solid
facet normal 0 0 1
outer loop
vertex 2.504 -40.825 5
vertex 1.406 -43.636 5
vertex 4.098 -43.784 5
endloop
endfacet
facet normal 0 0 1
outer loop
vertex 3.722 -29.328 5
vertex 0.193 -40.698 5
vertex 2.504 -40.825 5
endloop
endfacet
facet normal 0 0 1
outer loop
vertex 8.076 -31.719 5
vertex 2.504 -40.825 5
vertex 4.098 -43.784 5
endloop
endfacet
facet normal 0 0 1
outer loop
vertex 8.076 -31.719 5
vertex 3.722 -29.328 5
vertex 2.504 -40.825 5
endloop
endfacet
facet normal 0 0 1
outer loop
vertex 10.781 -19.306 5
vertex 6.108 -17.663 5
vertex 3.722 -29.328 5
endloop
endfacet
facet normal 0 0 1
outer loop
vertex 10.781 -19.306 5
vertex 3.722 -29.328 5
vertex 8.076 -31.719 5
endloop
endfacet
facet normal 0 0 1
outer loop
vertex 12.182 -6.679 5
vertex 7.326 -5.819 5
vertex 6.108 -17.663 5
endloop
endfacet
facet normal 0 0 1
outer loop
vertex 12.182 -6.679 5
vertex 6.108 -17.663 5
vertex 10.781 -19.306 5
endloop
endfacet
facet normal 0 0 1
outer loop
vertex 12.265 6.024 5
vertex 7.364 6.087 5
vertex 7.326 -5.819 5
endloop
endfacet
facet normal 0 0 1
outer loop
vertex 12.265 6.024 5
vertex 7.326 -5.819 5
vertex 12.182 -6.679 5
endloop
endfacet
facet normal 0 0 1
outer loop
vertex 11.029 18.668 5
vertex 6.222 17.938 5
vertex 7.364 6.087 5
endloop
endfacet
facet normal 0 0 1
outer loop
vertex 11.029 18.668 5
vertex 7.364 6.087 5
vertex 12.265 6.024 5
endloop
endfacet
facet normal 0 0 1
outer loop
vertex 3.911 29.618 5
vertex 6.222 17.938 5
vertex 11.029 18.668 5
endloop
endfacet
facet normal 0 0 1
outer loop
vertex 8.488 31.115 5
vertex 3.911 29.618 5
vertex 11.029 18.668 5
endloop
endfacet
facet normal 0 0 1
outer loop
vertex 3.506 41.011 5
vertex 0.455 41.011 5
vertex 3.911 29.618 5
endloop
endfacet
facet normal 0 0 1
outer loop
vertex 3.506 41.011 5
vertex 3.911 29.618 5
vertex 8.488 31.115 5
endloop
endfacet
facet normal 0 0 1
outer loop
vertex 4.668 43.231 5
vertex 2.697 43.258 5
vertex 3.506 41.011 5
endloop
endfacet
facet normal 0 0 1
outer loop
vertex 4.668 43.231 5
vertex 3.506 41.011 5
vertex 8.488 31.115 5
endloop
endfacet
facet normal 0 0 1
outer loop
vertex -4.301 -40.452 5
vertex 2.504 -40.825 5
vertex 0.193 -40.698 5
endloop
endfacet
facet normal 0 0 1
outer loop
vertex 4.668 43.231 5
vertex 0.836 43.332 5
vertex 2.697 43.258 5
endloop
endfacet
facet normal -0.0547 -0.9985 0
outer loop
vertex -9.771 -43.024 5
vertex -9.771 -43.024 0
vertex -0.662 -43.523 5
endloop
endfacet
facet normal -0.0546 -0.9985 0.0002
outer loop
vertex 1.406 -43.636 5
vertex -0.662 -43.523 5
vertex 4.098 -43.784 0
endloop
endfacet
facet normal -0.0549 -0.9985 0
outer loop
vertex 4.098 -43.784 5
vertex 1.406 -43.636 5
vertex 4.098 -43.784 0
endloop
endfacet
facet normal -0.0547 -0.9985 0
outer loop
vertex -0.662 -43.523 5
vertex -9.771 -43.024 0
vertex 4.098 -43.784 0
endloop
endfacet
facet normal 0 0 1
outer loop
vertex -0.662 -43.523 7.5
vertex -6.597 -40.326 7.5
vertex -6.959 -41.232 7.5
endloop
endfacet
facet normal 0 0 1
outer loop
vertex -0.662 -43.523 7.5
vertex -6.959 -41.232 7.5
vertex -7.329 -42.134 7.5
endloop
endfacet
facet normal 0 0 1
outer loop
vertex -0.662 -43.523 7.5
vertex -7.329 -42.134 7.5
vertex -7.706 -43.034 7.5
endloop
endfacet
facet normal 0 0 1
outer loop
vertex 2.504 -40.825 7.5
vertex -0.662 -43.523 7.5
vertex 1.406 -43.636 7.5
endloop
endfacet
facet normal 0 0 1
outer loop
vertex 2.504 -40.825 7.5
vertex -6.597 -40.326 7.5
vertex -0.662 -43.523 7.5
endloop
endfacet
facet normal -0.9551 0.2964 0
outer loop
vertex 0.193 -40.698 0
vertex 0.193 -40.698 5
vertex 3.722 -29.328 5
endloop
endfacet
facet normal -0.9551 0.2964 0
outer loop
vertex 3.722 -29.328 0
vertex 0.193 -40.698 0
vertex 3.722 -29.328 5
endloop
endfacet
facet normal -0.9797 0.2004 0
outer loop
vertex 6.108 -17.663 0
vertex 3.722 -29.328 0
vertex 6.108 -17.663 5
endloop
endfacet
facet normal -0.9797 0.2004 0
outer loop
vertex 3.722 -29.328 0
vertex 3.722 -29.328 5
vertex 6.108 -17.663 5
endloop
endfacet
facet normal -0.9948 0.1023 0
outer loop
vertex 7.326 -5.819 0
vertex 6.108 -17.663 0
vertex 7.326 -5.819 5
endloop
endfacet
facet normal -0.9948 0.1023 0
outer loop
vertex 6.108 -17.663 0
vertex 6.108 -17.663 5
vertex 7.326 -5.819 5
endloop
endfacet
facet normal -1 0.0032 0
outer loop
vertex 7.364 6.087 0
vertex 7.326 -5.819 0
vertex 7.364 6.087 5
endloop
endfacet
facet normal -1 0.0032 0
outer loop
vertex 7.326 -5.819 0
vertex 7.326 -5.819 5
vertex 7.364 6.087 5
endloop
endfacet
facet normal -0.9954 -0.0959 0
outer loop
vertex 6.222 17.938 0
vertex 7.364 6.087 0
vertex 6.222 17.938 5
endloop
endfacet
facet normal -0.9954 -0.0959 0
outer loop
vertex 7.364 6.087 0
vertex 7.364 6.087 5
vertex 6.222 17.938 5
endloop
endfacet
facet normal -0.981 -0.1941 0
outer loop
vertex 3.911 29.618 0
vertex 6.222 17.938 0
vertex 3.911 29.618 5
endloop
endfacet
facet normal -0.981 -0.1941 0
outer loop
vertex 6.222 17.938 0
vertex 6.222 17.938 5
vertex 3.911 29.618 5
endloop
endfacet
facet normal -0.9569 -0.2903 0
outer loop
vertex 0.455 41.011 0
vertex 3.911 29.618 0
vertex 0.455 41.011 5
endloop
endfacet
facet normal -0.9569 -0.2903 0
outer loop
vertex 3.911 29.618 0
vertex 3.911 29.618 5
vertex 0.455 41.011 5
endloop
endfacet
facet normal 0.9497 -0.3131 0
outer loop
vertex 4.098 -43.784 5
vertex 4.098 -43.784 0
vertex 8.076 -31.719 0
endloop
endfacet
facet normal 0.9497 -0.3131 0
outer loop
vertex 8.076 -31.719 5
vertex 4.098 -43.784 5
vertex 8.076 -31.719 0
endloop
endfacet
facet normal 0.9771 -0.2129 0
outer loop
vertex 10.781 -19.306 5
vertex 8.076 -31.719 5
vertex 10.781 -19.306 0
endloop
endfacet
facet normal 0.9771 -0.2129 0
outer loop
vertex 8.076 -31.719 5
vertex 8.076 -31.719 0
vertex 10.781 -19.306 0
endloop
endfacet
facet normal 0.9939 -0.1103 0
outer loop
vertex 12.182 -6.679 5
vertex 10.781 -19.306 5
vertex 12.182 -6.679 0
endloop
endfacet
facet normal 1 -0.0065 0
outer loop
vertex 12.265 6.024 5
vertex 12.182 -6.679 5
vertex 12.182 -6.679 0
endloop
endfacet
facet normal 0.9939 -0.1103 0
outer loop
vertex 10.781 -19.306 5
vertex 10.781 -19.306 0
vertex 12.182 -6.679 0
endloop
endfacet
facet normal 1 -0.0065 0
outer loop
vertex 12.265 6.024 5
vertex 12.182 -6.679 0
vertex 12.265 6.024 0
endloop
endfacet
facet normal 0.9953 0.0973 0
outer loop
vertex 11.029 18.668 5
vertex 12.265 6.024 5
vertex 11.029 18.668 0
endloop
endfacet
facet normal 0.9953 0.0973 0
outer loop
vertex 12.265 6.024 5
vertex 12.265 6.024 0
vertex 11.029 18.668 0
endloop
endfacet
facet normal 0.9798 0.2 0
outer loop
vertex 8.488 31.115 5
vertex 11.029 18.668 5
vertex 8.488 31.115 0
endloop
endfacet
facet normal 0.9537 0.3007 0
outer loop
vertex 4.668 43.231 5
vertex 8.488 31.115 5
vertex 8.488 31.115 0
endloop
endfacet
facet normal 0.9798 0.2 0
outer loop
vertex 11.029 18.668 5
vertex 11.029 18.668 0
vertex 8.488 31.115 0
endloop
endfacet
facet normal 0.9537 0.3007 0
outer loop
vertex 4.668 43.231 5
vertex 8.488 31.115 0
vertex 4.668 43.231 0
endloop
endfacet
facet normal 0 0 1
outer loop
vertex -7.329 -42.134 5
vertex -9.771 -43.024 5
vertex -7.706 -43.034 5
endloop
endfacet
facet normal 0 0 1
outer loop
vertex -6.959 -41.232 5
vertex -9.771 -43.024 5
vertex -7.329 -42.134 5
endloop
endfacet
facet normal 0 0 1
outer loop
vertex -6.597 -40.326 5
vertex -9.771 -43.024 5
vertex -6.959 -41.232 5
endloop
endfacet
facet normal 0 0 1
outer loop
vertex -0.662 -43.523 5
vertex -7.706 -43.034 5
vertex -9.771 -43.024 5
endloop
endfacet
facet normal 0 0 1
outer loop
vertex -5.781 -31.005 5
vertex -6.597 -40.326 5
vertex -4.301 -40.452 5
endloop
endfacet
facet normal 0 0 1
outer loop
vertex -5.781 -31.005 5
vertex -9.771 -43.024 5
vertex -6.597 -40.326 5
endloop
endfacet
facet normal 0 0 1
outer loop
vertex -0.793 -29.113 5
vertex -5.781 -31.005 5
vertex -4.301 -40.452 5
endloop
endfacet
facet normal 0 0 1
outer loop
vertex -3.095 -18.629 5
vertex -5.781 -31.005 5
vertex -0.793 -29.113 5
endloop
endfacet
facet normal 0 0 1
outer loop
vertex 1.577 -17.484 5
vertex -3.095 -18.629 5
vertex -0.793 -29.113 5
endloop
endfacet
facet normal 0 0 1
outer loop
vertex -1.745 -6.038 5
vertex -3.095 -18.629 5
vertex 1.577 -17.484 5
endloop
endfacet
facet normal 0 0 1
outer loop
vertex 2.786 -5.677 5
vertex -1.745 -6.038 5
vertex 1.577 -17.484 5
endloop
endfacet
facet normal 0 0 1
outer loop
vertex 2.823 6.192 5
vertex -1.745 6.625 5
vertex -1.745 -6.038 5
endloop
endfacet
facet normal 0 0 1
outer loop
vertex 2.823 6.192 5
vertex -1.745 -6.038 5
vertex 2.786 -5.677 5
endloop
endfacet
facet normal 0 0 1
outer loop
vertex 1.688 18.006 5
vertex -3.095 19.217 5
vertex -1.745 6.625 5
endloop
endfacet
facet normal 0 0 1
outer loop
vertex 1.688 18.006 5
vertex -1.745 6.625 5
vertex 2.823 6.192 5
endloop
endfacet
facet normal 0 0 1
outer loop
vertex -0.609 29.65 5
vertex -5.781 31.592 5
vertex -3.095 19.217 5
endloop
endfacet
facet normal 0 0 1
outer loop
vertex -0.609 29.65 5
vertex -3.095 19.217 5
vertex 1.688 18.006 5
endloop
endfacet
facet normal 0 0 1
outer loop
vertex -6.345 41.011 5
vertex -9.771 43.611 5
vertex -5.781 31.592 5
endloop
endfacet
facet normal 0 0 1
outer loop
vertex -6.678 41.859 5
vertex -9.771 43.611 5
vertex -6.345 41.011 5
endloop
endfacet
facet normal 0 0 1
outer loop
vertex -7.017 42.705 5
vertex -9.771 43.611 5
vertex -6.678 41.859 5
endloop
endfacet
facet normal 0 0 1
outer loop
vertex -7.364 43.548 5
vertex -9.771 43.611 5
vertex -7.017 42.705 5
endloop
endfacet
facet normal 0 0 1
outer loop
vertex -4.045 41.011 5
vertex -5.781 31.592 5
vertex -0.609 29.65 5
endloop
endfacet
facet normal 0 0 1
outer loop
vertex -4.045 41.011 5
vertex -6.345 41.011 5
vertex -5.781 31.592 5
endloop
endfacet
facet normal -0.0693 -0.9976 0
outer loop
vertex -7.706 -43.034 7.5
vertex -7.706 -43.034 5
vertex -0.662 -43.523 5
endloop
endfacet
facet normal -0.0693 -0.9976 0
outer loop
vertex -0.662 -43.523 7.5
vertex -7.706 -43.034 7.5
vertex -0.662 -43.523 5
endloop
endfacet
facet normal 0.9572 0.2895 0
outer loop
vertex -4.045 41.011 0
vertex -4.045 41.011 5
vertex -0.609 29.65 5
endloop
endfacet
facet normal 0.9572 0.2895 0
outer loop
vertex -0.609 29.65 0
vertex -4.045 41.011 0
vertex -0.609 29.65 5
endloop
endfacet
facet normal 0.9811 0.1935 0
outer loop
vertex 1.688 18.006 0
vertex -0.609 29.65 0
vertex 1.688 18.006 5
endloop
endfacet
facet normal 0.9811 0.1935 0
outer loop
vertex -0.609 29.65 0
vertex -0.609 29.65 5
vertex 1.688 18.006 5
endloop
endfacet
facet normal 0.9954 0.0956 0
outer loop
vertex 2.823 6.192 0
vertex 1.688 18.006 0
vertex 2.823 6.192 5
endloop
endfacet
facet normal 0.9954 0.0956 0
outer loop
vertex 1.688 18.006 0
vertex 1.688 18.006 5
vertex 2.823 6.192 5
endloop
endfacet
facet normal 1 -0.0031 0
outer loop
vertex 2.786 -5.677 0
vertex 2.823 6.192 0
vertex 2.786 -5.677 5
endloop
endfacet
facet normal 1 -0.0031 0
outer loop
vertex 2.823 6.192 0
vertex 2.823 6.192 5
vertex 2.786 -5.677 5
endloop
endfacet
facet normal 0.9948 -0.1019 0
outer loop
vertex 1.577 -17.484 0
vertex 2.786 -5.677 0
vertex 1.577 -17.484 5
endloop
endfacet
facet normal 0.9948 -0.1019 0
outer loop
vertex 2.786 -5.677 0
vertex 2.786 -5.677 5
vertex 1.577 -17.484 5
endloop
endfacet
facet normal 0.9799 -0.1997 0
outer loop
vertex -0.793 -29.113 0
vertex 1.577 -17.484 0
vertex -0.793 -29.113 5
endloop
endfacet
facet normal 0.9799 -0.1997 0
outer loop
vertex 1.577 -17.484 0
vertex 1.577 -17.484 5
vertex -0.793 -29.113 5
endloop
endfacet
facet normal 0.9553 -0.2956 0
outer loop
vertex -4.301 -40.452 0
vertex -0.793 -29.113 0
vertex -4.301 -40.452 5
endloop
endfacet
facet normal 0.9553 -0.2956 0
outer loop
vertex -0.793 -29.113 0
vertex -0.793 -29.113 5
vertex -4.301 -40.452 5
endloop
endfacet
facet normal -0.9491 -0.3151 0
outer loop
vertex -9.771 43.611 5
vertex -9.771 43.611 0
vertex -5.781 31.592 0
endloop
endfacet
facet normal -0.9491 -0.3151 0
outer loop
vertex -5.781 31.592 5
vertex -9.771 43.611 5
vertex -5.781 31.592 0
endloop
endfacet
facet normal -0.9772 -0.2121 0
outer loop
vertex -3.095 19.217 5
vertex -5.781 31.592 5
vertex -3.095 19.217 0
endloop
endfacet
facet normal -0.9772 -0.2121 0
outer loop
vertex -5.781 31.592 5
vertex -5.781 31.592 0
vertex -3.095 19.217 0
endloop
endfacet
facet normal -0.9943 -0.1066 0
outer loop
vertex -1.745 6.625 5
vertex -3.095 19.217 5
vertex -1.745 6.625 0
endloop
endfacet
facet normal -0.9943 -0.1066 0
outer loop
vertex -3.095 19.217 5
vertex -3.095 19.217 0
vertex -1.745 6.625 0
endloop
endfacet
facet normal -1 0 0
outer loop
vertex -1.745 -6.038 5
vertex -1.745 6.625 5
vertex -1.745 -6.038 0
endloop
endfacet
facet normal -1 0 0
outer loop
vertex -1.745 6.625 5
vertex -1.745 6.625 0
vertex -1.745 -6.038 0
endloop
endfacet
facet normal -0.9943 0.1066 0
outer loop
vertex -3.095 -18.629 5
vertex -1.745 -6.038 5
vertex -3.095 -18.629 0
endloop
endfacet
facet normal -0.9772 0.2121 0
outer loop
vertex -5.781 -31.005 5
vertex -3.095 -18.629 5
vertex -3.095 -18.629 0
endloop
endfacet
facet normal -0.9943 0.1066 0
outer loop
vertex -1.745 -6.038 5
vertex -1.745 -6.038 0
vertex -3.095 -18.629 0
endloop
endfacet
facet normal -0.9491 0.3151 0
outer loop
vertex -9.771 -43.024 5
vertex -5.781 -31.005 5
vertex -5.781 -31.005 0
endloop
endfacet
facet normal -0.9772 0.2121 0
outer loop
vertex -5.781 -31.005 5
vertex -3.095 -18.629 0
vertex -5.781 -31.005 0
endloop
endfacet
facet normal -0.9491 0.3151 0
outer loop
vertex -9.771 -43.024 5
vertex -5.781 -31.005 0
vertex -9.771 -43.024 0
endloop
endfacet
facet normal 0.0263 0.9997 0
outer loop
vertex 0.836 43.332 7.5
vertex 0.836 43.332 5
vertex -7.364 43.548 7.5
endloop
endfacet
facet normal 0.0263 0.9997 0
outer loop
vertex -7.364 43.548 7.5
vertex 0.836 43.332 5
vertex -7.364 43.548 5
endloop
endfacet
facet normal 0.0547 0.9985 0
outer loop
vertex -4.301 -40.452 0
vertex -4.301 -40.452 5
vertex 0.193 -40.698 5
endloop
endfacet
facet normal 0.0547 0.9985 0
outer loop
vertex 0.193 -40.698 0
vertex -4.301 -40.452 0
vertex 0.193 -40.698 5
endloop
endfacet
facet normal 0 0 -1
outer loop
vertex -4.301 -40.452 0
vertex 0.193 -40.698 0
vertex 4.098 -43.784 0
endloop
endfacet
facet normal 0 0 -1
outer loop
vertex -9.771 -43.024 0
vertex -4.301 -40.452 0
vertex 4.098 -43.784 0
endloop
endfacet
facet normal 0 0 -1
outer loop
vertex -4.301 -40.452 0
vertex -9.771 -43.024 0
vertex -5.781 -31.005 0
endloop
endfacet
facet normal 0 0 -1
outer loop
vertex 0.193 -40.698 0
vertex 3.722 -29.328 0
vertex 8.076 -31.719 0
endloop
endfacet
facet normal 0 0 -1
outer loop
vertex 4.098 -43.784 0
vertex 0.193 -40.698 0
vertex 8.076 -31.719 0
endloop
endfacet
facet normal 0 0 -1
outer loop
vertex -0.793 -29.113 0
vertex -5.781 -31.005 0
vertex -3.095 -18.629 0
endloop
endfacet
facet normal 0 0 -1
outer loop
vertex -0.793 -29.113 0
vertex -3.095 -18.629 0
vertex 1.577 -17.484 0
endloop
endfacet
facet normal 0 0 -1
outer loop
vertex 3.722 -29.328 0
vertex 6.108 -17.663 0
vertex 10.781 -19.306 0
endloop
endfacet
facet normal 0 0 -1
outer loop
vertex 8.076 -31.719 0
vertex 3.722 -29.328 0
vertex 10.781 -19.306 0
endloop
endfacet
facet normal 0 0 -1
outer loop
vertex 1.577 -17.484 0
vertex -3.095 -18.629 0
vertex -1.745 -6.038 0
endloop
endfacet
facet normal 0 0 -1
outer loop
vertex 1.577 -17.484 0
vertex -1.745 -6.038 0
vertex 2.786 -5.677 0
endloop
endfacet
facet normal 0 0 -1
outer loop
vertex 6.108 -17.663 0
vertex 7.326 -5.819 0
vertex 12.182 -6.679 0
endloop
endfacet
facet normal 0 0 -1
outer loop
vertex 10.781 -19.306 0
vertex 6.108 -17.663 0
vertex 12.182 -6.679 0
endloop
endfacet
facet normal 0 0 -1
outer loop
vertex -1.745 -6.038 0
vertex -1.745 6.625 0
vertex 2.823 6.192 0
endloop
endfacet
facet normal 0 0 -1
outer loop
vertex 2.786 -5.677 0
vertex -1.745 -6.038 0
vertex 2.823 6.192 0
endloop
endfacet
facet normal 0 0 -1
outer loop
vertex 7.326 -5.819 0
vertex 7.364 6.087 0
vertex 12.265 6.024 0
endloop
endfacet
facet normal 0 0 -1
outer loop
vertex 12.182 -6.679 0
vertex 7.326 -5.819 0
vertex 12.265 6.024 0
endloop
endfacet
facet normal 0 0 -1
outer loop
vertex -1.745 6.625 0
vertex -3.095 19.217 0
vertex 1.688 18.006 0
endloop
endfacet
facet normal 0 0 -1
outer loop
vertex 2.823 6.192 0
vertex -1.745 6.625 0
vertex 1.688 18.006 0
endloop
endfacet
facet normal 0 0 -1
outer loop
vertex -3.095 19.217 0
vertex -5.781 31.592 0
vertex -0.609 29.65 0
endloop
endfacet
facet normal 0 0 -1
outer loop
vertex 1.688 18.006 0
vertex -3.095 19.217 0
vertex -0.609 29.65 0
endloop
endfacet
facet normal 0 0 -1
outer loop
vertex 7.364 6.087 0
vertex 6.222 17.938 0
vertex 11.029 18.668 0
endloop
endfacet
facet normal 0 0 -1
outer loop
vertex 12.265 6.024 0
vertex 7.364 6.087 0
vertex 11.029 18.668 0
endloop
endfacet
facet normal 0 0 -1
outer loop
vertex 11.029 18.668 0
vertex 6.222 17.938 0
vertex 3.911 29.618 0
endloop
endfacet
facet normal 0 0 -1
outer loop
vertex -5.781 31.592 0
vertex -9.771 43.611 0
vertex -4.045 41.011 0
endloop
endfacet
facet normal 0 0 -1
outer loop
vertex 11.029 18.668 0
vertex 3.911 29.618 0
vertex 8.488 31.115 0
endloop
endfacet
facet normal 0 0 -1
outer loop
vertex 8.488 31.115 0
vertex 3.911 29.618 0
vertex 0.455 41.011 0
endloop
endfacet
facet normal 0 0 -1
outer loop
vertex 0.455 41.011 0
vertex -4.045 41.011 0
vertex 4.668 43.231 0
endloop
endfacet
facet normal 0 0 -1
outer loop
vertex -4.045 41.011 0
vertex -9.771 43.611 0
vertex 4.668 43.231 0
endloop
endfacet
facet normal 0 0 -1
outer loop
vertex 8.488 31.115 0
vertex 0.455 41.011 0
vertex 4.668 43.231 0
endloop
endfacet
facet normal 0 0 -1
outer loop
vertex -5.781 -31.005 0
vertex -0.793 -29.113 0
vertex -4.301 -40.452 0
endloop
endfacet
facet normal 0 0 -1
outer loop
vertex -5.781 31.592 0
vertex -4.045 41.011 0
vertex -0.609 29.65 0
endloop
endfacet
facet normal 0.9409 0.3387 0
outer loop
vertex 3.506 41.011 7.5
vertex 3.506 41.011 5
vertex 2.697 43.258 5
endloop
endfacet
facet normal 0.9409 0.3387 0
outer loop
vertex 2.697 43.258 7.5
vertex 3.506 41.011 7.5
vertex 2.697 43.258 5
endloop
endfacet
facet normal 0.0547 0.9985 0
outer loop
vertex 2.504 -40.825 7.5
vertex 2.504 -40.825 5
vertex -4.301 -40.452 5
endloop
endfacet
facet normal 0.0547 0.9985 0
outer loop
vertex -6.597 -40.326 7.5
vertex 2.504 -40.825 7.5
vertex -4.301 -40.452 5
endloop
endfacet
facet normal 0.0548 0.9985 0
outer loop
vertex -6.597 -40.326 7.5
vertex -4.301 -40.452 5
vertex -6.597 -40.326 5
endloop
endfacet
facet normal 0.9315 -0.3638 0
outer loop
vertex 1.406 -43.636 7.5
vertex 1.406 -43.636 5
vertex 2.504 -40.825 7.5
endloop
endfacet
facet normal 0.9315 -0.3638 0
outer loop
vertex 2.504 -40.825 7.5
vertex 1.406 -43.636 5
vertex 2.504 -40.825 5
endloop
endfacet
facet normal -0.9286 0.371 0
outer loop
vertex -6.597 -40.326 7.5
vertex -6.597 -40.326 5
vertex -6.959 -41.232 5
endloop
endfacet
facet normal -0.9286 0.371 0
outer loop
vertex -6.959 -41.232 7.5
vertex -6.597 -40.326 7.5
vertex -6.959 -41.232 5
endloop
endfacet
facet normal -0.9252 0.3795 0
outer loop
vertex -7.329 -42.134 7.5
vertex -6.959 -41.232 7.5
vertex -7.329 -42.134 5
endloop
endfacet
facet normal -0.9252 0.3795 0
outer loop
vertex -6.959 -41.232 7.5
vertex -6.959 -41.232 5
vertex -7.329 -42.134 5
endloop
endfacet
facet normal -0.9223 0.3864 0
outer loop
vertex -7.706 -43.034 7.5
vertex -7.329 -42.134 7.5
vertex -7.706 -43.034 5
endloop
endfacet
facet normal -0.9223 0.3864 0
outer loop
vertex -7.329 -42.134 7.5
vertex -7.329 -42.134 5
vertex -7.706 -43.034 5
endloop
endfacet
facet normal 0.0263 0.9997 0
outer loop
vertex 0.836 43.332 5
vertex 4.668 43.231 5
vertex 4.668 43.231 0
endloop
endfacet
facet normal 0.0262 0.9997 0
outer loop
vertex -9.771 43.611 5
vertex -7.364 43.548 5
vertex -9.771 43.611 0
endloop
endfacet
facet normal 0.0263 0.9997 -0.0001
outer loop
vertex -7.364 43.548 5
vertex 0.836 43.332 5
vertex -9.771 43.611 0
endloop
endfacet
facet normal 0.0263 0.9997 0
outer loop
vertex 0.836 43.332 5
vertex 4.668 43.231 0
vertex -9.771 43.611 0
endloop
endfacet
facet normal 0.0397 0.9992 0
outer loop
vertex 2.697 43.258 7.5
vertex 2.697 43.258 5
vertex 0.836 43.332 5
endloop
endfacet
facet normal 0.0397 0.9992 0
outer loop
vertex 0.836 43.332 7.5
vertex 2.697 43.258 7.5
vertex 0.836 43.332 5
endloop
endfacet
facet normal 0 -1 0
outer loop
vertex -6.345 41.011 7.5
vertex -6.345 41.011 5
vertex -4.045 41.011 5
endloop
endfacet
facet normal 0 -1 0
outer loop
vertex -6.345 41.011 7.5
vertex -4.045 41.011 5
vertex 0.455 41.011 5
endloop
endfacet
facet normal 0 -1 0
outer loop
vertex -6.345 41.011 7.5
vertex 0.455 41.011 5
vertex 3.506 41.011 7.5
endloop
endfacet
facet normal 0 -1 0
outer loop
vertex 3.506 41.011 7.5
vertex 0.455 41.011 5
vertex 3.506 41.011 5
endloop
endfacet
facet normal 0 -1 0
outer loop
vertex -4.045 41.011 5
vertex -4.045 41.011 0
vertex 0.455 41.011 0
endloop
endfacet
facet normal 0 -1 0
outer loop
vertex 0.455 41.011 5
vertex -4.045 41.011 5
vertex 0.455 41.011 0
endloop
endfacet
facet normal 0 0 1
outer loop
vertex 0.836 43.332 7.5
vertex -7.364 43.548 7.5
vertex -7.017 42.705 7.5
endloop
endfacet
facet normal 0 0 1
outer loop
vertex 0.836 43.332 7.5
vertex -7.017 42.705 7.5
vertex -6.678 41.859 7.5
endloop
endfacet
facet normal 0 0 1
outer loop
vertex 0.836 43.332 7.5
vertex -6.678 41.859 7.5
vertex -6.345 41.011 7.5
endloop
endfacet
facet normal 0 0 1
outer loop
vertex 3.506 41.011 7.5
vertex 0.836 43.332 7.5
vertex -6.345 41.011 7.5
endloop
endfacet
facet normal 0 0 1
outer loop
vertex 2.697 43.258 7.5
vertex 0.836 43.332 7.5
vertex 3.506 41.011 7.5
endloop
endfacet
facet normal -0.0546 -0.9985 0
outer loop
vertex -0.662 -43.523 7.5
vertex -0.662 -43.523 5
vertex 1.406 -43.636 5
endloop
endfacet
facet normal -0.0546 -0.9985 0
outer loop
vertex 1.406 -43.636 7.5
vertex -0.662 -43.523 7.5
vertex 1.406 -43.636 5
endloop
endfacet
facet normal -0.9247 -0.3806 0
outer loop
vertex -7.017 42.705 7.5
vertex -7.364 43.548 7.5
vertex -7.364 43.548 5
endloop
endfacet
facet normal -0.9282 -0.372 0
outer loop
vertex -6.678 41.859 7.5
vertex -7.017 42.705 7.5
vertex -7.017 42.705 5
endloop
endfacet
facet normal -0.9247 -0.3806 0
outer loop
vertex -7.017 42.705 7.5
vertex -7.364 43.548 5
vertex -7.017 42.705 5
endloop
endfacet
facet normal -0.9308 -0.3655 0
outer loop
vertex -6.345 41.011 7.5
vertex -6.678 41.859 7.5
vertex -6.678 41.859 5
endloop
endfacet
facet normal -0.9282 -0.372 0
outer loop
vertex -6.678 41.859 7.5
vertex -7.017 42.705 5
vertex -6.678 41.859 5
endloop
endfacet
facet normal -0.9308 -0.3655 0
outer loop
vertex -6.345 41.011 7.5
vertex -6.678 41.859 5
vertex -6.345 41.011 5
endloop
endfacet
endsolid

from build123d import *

# Parameters (mm, degrees)
F1_DEPTH = 5
F3_DEPTH = 2.5
F5_DEPTH = 25


with BuildPart() as f1:
    # F0 (on Top) → F1 (new body)
    with BuildSketch(Plane.XY):
        with BuildLine():
            ThreePointArc((-9.771052, 43.610957), (-1.575845, 0.293702), (-9.771052, -43.023552))
            Line((-9.771052, -43.023552), (4.098068, -43.7835))
            ThreePointArc((4.098068, -43.7835), (12.388804, -0.328701), (4.668032, 43.230977))
            Line((4.668032, 43.230977), (-9.771052, 43.610957))
        make_face()
    extrude(amount=F1_DEPTH)

    # F2 (on face) → F3 (join)
    with BuildSketch(Plane.XY.offset(5)):
        with BuildLine():
            ThreePointArc((-7.36353, 43.547601), (-6.846603, 42.282316), (-6.345194, 41.010802))
            Line((-6.345194, 41.010802), (3.505516, 41.010802))
            Line((3.505516, 41.010802), (2.697484, 43.258171))
            Line((2.697484, 43.258171), (0.835687, 43.33183))
            Line((0.835687, 43.33183), (-7.36353, 43.547601))
        make_face()
        with BuildLine():
            ThreePointArc((-6.597064, -40.326348), (-7.1427, -41.683608), (-7.70606, -43.033606))
            Line((-7.70606, -43.033606), (-0.661875, -43.522683))
            Line((-0.661875, -43.522683), (1.406391, -43.636012))
            Line((1.406391, -43.636012), (2.504335, -40.825053))
            Line((2.504335, -40.825053), (-6.597064, -40.326348))
        make_face()
    extrude(amount=F3_DEPTH)

    # F4 (on face) → F5 (cut)
    with BuildSketch(Plane.XY.offset(5)):
        with BuildLine():
            ThreePointArc((-4.045194, 41.010802), (2.951389, 0.25698), (-4.300509, -40.452186))
            Line((-4.300509, -40.452186), (0.192751, -40.698391))
            ThreePointArc((0.192751, -40.698391), (7.492519, 0.133214), (0.454806, 41.010802))
            Line((0.454806, 41.010802), (-4.045194, 41.010802))
        make_face()
    extrude(amount=-F5_DEPTH, mode=Mode.SUBTRACT)


solid = f1.part
